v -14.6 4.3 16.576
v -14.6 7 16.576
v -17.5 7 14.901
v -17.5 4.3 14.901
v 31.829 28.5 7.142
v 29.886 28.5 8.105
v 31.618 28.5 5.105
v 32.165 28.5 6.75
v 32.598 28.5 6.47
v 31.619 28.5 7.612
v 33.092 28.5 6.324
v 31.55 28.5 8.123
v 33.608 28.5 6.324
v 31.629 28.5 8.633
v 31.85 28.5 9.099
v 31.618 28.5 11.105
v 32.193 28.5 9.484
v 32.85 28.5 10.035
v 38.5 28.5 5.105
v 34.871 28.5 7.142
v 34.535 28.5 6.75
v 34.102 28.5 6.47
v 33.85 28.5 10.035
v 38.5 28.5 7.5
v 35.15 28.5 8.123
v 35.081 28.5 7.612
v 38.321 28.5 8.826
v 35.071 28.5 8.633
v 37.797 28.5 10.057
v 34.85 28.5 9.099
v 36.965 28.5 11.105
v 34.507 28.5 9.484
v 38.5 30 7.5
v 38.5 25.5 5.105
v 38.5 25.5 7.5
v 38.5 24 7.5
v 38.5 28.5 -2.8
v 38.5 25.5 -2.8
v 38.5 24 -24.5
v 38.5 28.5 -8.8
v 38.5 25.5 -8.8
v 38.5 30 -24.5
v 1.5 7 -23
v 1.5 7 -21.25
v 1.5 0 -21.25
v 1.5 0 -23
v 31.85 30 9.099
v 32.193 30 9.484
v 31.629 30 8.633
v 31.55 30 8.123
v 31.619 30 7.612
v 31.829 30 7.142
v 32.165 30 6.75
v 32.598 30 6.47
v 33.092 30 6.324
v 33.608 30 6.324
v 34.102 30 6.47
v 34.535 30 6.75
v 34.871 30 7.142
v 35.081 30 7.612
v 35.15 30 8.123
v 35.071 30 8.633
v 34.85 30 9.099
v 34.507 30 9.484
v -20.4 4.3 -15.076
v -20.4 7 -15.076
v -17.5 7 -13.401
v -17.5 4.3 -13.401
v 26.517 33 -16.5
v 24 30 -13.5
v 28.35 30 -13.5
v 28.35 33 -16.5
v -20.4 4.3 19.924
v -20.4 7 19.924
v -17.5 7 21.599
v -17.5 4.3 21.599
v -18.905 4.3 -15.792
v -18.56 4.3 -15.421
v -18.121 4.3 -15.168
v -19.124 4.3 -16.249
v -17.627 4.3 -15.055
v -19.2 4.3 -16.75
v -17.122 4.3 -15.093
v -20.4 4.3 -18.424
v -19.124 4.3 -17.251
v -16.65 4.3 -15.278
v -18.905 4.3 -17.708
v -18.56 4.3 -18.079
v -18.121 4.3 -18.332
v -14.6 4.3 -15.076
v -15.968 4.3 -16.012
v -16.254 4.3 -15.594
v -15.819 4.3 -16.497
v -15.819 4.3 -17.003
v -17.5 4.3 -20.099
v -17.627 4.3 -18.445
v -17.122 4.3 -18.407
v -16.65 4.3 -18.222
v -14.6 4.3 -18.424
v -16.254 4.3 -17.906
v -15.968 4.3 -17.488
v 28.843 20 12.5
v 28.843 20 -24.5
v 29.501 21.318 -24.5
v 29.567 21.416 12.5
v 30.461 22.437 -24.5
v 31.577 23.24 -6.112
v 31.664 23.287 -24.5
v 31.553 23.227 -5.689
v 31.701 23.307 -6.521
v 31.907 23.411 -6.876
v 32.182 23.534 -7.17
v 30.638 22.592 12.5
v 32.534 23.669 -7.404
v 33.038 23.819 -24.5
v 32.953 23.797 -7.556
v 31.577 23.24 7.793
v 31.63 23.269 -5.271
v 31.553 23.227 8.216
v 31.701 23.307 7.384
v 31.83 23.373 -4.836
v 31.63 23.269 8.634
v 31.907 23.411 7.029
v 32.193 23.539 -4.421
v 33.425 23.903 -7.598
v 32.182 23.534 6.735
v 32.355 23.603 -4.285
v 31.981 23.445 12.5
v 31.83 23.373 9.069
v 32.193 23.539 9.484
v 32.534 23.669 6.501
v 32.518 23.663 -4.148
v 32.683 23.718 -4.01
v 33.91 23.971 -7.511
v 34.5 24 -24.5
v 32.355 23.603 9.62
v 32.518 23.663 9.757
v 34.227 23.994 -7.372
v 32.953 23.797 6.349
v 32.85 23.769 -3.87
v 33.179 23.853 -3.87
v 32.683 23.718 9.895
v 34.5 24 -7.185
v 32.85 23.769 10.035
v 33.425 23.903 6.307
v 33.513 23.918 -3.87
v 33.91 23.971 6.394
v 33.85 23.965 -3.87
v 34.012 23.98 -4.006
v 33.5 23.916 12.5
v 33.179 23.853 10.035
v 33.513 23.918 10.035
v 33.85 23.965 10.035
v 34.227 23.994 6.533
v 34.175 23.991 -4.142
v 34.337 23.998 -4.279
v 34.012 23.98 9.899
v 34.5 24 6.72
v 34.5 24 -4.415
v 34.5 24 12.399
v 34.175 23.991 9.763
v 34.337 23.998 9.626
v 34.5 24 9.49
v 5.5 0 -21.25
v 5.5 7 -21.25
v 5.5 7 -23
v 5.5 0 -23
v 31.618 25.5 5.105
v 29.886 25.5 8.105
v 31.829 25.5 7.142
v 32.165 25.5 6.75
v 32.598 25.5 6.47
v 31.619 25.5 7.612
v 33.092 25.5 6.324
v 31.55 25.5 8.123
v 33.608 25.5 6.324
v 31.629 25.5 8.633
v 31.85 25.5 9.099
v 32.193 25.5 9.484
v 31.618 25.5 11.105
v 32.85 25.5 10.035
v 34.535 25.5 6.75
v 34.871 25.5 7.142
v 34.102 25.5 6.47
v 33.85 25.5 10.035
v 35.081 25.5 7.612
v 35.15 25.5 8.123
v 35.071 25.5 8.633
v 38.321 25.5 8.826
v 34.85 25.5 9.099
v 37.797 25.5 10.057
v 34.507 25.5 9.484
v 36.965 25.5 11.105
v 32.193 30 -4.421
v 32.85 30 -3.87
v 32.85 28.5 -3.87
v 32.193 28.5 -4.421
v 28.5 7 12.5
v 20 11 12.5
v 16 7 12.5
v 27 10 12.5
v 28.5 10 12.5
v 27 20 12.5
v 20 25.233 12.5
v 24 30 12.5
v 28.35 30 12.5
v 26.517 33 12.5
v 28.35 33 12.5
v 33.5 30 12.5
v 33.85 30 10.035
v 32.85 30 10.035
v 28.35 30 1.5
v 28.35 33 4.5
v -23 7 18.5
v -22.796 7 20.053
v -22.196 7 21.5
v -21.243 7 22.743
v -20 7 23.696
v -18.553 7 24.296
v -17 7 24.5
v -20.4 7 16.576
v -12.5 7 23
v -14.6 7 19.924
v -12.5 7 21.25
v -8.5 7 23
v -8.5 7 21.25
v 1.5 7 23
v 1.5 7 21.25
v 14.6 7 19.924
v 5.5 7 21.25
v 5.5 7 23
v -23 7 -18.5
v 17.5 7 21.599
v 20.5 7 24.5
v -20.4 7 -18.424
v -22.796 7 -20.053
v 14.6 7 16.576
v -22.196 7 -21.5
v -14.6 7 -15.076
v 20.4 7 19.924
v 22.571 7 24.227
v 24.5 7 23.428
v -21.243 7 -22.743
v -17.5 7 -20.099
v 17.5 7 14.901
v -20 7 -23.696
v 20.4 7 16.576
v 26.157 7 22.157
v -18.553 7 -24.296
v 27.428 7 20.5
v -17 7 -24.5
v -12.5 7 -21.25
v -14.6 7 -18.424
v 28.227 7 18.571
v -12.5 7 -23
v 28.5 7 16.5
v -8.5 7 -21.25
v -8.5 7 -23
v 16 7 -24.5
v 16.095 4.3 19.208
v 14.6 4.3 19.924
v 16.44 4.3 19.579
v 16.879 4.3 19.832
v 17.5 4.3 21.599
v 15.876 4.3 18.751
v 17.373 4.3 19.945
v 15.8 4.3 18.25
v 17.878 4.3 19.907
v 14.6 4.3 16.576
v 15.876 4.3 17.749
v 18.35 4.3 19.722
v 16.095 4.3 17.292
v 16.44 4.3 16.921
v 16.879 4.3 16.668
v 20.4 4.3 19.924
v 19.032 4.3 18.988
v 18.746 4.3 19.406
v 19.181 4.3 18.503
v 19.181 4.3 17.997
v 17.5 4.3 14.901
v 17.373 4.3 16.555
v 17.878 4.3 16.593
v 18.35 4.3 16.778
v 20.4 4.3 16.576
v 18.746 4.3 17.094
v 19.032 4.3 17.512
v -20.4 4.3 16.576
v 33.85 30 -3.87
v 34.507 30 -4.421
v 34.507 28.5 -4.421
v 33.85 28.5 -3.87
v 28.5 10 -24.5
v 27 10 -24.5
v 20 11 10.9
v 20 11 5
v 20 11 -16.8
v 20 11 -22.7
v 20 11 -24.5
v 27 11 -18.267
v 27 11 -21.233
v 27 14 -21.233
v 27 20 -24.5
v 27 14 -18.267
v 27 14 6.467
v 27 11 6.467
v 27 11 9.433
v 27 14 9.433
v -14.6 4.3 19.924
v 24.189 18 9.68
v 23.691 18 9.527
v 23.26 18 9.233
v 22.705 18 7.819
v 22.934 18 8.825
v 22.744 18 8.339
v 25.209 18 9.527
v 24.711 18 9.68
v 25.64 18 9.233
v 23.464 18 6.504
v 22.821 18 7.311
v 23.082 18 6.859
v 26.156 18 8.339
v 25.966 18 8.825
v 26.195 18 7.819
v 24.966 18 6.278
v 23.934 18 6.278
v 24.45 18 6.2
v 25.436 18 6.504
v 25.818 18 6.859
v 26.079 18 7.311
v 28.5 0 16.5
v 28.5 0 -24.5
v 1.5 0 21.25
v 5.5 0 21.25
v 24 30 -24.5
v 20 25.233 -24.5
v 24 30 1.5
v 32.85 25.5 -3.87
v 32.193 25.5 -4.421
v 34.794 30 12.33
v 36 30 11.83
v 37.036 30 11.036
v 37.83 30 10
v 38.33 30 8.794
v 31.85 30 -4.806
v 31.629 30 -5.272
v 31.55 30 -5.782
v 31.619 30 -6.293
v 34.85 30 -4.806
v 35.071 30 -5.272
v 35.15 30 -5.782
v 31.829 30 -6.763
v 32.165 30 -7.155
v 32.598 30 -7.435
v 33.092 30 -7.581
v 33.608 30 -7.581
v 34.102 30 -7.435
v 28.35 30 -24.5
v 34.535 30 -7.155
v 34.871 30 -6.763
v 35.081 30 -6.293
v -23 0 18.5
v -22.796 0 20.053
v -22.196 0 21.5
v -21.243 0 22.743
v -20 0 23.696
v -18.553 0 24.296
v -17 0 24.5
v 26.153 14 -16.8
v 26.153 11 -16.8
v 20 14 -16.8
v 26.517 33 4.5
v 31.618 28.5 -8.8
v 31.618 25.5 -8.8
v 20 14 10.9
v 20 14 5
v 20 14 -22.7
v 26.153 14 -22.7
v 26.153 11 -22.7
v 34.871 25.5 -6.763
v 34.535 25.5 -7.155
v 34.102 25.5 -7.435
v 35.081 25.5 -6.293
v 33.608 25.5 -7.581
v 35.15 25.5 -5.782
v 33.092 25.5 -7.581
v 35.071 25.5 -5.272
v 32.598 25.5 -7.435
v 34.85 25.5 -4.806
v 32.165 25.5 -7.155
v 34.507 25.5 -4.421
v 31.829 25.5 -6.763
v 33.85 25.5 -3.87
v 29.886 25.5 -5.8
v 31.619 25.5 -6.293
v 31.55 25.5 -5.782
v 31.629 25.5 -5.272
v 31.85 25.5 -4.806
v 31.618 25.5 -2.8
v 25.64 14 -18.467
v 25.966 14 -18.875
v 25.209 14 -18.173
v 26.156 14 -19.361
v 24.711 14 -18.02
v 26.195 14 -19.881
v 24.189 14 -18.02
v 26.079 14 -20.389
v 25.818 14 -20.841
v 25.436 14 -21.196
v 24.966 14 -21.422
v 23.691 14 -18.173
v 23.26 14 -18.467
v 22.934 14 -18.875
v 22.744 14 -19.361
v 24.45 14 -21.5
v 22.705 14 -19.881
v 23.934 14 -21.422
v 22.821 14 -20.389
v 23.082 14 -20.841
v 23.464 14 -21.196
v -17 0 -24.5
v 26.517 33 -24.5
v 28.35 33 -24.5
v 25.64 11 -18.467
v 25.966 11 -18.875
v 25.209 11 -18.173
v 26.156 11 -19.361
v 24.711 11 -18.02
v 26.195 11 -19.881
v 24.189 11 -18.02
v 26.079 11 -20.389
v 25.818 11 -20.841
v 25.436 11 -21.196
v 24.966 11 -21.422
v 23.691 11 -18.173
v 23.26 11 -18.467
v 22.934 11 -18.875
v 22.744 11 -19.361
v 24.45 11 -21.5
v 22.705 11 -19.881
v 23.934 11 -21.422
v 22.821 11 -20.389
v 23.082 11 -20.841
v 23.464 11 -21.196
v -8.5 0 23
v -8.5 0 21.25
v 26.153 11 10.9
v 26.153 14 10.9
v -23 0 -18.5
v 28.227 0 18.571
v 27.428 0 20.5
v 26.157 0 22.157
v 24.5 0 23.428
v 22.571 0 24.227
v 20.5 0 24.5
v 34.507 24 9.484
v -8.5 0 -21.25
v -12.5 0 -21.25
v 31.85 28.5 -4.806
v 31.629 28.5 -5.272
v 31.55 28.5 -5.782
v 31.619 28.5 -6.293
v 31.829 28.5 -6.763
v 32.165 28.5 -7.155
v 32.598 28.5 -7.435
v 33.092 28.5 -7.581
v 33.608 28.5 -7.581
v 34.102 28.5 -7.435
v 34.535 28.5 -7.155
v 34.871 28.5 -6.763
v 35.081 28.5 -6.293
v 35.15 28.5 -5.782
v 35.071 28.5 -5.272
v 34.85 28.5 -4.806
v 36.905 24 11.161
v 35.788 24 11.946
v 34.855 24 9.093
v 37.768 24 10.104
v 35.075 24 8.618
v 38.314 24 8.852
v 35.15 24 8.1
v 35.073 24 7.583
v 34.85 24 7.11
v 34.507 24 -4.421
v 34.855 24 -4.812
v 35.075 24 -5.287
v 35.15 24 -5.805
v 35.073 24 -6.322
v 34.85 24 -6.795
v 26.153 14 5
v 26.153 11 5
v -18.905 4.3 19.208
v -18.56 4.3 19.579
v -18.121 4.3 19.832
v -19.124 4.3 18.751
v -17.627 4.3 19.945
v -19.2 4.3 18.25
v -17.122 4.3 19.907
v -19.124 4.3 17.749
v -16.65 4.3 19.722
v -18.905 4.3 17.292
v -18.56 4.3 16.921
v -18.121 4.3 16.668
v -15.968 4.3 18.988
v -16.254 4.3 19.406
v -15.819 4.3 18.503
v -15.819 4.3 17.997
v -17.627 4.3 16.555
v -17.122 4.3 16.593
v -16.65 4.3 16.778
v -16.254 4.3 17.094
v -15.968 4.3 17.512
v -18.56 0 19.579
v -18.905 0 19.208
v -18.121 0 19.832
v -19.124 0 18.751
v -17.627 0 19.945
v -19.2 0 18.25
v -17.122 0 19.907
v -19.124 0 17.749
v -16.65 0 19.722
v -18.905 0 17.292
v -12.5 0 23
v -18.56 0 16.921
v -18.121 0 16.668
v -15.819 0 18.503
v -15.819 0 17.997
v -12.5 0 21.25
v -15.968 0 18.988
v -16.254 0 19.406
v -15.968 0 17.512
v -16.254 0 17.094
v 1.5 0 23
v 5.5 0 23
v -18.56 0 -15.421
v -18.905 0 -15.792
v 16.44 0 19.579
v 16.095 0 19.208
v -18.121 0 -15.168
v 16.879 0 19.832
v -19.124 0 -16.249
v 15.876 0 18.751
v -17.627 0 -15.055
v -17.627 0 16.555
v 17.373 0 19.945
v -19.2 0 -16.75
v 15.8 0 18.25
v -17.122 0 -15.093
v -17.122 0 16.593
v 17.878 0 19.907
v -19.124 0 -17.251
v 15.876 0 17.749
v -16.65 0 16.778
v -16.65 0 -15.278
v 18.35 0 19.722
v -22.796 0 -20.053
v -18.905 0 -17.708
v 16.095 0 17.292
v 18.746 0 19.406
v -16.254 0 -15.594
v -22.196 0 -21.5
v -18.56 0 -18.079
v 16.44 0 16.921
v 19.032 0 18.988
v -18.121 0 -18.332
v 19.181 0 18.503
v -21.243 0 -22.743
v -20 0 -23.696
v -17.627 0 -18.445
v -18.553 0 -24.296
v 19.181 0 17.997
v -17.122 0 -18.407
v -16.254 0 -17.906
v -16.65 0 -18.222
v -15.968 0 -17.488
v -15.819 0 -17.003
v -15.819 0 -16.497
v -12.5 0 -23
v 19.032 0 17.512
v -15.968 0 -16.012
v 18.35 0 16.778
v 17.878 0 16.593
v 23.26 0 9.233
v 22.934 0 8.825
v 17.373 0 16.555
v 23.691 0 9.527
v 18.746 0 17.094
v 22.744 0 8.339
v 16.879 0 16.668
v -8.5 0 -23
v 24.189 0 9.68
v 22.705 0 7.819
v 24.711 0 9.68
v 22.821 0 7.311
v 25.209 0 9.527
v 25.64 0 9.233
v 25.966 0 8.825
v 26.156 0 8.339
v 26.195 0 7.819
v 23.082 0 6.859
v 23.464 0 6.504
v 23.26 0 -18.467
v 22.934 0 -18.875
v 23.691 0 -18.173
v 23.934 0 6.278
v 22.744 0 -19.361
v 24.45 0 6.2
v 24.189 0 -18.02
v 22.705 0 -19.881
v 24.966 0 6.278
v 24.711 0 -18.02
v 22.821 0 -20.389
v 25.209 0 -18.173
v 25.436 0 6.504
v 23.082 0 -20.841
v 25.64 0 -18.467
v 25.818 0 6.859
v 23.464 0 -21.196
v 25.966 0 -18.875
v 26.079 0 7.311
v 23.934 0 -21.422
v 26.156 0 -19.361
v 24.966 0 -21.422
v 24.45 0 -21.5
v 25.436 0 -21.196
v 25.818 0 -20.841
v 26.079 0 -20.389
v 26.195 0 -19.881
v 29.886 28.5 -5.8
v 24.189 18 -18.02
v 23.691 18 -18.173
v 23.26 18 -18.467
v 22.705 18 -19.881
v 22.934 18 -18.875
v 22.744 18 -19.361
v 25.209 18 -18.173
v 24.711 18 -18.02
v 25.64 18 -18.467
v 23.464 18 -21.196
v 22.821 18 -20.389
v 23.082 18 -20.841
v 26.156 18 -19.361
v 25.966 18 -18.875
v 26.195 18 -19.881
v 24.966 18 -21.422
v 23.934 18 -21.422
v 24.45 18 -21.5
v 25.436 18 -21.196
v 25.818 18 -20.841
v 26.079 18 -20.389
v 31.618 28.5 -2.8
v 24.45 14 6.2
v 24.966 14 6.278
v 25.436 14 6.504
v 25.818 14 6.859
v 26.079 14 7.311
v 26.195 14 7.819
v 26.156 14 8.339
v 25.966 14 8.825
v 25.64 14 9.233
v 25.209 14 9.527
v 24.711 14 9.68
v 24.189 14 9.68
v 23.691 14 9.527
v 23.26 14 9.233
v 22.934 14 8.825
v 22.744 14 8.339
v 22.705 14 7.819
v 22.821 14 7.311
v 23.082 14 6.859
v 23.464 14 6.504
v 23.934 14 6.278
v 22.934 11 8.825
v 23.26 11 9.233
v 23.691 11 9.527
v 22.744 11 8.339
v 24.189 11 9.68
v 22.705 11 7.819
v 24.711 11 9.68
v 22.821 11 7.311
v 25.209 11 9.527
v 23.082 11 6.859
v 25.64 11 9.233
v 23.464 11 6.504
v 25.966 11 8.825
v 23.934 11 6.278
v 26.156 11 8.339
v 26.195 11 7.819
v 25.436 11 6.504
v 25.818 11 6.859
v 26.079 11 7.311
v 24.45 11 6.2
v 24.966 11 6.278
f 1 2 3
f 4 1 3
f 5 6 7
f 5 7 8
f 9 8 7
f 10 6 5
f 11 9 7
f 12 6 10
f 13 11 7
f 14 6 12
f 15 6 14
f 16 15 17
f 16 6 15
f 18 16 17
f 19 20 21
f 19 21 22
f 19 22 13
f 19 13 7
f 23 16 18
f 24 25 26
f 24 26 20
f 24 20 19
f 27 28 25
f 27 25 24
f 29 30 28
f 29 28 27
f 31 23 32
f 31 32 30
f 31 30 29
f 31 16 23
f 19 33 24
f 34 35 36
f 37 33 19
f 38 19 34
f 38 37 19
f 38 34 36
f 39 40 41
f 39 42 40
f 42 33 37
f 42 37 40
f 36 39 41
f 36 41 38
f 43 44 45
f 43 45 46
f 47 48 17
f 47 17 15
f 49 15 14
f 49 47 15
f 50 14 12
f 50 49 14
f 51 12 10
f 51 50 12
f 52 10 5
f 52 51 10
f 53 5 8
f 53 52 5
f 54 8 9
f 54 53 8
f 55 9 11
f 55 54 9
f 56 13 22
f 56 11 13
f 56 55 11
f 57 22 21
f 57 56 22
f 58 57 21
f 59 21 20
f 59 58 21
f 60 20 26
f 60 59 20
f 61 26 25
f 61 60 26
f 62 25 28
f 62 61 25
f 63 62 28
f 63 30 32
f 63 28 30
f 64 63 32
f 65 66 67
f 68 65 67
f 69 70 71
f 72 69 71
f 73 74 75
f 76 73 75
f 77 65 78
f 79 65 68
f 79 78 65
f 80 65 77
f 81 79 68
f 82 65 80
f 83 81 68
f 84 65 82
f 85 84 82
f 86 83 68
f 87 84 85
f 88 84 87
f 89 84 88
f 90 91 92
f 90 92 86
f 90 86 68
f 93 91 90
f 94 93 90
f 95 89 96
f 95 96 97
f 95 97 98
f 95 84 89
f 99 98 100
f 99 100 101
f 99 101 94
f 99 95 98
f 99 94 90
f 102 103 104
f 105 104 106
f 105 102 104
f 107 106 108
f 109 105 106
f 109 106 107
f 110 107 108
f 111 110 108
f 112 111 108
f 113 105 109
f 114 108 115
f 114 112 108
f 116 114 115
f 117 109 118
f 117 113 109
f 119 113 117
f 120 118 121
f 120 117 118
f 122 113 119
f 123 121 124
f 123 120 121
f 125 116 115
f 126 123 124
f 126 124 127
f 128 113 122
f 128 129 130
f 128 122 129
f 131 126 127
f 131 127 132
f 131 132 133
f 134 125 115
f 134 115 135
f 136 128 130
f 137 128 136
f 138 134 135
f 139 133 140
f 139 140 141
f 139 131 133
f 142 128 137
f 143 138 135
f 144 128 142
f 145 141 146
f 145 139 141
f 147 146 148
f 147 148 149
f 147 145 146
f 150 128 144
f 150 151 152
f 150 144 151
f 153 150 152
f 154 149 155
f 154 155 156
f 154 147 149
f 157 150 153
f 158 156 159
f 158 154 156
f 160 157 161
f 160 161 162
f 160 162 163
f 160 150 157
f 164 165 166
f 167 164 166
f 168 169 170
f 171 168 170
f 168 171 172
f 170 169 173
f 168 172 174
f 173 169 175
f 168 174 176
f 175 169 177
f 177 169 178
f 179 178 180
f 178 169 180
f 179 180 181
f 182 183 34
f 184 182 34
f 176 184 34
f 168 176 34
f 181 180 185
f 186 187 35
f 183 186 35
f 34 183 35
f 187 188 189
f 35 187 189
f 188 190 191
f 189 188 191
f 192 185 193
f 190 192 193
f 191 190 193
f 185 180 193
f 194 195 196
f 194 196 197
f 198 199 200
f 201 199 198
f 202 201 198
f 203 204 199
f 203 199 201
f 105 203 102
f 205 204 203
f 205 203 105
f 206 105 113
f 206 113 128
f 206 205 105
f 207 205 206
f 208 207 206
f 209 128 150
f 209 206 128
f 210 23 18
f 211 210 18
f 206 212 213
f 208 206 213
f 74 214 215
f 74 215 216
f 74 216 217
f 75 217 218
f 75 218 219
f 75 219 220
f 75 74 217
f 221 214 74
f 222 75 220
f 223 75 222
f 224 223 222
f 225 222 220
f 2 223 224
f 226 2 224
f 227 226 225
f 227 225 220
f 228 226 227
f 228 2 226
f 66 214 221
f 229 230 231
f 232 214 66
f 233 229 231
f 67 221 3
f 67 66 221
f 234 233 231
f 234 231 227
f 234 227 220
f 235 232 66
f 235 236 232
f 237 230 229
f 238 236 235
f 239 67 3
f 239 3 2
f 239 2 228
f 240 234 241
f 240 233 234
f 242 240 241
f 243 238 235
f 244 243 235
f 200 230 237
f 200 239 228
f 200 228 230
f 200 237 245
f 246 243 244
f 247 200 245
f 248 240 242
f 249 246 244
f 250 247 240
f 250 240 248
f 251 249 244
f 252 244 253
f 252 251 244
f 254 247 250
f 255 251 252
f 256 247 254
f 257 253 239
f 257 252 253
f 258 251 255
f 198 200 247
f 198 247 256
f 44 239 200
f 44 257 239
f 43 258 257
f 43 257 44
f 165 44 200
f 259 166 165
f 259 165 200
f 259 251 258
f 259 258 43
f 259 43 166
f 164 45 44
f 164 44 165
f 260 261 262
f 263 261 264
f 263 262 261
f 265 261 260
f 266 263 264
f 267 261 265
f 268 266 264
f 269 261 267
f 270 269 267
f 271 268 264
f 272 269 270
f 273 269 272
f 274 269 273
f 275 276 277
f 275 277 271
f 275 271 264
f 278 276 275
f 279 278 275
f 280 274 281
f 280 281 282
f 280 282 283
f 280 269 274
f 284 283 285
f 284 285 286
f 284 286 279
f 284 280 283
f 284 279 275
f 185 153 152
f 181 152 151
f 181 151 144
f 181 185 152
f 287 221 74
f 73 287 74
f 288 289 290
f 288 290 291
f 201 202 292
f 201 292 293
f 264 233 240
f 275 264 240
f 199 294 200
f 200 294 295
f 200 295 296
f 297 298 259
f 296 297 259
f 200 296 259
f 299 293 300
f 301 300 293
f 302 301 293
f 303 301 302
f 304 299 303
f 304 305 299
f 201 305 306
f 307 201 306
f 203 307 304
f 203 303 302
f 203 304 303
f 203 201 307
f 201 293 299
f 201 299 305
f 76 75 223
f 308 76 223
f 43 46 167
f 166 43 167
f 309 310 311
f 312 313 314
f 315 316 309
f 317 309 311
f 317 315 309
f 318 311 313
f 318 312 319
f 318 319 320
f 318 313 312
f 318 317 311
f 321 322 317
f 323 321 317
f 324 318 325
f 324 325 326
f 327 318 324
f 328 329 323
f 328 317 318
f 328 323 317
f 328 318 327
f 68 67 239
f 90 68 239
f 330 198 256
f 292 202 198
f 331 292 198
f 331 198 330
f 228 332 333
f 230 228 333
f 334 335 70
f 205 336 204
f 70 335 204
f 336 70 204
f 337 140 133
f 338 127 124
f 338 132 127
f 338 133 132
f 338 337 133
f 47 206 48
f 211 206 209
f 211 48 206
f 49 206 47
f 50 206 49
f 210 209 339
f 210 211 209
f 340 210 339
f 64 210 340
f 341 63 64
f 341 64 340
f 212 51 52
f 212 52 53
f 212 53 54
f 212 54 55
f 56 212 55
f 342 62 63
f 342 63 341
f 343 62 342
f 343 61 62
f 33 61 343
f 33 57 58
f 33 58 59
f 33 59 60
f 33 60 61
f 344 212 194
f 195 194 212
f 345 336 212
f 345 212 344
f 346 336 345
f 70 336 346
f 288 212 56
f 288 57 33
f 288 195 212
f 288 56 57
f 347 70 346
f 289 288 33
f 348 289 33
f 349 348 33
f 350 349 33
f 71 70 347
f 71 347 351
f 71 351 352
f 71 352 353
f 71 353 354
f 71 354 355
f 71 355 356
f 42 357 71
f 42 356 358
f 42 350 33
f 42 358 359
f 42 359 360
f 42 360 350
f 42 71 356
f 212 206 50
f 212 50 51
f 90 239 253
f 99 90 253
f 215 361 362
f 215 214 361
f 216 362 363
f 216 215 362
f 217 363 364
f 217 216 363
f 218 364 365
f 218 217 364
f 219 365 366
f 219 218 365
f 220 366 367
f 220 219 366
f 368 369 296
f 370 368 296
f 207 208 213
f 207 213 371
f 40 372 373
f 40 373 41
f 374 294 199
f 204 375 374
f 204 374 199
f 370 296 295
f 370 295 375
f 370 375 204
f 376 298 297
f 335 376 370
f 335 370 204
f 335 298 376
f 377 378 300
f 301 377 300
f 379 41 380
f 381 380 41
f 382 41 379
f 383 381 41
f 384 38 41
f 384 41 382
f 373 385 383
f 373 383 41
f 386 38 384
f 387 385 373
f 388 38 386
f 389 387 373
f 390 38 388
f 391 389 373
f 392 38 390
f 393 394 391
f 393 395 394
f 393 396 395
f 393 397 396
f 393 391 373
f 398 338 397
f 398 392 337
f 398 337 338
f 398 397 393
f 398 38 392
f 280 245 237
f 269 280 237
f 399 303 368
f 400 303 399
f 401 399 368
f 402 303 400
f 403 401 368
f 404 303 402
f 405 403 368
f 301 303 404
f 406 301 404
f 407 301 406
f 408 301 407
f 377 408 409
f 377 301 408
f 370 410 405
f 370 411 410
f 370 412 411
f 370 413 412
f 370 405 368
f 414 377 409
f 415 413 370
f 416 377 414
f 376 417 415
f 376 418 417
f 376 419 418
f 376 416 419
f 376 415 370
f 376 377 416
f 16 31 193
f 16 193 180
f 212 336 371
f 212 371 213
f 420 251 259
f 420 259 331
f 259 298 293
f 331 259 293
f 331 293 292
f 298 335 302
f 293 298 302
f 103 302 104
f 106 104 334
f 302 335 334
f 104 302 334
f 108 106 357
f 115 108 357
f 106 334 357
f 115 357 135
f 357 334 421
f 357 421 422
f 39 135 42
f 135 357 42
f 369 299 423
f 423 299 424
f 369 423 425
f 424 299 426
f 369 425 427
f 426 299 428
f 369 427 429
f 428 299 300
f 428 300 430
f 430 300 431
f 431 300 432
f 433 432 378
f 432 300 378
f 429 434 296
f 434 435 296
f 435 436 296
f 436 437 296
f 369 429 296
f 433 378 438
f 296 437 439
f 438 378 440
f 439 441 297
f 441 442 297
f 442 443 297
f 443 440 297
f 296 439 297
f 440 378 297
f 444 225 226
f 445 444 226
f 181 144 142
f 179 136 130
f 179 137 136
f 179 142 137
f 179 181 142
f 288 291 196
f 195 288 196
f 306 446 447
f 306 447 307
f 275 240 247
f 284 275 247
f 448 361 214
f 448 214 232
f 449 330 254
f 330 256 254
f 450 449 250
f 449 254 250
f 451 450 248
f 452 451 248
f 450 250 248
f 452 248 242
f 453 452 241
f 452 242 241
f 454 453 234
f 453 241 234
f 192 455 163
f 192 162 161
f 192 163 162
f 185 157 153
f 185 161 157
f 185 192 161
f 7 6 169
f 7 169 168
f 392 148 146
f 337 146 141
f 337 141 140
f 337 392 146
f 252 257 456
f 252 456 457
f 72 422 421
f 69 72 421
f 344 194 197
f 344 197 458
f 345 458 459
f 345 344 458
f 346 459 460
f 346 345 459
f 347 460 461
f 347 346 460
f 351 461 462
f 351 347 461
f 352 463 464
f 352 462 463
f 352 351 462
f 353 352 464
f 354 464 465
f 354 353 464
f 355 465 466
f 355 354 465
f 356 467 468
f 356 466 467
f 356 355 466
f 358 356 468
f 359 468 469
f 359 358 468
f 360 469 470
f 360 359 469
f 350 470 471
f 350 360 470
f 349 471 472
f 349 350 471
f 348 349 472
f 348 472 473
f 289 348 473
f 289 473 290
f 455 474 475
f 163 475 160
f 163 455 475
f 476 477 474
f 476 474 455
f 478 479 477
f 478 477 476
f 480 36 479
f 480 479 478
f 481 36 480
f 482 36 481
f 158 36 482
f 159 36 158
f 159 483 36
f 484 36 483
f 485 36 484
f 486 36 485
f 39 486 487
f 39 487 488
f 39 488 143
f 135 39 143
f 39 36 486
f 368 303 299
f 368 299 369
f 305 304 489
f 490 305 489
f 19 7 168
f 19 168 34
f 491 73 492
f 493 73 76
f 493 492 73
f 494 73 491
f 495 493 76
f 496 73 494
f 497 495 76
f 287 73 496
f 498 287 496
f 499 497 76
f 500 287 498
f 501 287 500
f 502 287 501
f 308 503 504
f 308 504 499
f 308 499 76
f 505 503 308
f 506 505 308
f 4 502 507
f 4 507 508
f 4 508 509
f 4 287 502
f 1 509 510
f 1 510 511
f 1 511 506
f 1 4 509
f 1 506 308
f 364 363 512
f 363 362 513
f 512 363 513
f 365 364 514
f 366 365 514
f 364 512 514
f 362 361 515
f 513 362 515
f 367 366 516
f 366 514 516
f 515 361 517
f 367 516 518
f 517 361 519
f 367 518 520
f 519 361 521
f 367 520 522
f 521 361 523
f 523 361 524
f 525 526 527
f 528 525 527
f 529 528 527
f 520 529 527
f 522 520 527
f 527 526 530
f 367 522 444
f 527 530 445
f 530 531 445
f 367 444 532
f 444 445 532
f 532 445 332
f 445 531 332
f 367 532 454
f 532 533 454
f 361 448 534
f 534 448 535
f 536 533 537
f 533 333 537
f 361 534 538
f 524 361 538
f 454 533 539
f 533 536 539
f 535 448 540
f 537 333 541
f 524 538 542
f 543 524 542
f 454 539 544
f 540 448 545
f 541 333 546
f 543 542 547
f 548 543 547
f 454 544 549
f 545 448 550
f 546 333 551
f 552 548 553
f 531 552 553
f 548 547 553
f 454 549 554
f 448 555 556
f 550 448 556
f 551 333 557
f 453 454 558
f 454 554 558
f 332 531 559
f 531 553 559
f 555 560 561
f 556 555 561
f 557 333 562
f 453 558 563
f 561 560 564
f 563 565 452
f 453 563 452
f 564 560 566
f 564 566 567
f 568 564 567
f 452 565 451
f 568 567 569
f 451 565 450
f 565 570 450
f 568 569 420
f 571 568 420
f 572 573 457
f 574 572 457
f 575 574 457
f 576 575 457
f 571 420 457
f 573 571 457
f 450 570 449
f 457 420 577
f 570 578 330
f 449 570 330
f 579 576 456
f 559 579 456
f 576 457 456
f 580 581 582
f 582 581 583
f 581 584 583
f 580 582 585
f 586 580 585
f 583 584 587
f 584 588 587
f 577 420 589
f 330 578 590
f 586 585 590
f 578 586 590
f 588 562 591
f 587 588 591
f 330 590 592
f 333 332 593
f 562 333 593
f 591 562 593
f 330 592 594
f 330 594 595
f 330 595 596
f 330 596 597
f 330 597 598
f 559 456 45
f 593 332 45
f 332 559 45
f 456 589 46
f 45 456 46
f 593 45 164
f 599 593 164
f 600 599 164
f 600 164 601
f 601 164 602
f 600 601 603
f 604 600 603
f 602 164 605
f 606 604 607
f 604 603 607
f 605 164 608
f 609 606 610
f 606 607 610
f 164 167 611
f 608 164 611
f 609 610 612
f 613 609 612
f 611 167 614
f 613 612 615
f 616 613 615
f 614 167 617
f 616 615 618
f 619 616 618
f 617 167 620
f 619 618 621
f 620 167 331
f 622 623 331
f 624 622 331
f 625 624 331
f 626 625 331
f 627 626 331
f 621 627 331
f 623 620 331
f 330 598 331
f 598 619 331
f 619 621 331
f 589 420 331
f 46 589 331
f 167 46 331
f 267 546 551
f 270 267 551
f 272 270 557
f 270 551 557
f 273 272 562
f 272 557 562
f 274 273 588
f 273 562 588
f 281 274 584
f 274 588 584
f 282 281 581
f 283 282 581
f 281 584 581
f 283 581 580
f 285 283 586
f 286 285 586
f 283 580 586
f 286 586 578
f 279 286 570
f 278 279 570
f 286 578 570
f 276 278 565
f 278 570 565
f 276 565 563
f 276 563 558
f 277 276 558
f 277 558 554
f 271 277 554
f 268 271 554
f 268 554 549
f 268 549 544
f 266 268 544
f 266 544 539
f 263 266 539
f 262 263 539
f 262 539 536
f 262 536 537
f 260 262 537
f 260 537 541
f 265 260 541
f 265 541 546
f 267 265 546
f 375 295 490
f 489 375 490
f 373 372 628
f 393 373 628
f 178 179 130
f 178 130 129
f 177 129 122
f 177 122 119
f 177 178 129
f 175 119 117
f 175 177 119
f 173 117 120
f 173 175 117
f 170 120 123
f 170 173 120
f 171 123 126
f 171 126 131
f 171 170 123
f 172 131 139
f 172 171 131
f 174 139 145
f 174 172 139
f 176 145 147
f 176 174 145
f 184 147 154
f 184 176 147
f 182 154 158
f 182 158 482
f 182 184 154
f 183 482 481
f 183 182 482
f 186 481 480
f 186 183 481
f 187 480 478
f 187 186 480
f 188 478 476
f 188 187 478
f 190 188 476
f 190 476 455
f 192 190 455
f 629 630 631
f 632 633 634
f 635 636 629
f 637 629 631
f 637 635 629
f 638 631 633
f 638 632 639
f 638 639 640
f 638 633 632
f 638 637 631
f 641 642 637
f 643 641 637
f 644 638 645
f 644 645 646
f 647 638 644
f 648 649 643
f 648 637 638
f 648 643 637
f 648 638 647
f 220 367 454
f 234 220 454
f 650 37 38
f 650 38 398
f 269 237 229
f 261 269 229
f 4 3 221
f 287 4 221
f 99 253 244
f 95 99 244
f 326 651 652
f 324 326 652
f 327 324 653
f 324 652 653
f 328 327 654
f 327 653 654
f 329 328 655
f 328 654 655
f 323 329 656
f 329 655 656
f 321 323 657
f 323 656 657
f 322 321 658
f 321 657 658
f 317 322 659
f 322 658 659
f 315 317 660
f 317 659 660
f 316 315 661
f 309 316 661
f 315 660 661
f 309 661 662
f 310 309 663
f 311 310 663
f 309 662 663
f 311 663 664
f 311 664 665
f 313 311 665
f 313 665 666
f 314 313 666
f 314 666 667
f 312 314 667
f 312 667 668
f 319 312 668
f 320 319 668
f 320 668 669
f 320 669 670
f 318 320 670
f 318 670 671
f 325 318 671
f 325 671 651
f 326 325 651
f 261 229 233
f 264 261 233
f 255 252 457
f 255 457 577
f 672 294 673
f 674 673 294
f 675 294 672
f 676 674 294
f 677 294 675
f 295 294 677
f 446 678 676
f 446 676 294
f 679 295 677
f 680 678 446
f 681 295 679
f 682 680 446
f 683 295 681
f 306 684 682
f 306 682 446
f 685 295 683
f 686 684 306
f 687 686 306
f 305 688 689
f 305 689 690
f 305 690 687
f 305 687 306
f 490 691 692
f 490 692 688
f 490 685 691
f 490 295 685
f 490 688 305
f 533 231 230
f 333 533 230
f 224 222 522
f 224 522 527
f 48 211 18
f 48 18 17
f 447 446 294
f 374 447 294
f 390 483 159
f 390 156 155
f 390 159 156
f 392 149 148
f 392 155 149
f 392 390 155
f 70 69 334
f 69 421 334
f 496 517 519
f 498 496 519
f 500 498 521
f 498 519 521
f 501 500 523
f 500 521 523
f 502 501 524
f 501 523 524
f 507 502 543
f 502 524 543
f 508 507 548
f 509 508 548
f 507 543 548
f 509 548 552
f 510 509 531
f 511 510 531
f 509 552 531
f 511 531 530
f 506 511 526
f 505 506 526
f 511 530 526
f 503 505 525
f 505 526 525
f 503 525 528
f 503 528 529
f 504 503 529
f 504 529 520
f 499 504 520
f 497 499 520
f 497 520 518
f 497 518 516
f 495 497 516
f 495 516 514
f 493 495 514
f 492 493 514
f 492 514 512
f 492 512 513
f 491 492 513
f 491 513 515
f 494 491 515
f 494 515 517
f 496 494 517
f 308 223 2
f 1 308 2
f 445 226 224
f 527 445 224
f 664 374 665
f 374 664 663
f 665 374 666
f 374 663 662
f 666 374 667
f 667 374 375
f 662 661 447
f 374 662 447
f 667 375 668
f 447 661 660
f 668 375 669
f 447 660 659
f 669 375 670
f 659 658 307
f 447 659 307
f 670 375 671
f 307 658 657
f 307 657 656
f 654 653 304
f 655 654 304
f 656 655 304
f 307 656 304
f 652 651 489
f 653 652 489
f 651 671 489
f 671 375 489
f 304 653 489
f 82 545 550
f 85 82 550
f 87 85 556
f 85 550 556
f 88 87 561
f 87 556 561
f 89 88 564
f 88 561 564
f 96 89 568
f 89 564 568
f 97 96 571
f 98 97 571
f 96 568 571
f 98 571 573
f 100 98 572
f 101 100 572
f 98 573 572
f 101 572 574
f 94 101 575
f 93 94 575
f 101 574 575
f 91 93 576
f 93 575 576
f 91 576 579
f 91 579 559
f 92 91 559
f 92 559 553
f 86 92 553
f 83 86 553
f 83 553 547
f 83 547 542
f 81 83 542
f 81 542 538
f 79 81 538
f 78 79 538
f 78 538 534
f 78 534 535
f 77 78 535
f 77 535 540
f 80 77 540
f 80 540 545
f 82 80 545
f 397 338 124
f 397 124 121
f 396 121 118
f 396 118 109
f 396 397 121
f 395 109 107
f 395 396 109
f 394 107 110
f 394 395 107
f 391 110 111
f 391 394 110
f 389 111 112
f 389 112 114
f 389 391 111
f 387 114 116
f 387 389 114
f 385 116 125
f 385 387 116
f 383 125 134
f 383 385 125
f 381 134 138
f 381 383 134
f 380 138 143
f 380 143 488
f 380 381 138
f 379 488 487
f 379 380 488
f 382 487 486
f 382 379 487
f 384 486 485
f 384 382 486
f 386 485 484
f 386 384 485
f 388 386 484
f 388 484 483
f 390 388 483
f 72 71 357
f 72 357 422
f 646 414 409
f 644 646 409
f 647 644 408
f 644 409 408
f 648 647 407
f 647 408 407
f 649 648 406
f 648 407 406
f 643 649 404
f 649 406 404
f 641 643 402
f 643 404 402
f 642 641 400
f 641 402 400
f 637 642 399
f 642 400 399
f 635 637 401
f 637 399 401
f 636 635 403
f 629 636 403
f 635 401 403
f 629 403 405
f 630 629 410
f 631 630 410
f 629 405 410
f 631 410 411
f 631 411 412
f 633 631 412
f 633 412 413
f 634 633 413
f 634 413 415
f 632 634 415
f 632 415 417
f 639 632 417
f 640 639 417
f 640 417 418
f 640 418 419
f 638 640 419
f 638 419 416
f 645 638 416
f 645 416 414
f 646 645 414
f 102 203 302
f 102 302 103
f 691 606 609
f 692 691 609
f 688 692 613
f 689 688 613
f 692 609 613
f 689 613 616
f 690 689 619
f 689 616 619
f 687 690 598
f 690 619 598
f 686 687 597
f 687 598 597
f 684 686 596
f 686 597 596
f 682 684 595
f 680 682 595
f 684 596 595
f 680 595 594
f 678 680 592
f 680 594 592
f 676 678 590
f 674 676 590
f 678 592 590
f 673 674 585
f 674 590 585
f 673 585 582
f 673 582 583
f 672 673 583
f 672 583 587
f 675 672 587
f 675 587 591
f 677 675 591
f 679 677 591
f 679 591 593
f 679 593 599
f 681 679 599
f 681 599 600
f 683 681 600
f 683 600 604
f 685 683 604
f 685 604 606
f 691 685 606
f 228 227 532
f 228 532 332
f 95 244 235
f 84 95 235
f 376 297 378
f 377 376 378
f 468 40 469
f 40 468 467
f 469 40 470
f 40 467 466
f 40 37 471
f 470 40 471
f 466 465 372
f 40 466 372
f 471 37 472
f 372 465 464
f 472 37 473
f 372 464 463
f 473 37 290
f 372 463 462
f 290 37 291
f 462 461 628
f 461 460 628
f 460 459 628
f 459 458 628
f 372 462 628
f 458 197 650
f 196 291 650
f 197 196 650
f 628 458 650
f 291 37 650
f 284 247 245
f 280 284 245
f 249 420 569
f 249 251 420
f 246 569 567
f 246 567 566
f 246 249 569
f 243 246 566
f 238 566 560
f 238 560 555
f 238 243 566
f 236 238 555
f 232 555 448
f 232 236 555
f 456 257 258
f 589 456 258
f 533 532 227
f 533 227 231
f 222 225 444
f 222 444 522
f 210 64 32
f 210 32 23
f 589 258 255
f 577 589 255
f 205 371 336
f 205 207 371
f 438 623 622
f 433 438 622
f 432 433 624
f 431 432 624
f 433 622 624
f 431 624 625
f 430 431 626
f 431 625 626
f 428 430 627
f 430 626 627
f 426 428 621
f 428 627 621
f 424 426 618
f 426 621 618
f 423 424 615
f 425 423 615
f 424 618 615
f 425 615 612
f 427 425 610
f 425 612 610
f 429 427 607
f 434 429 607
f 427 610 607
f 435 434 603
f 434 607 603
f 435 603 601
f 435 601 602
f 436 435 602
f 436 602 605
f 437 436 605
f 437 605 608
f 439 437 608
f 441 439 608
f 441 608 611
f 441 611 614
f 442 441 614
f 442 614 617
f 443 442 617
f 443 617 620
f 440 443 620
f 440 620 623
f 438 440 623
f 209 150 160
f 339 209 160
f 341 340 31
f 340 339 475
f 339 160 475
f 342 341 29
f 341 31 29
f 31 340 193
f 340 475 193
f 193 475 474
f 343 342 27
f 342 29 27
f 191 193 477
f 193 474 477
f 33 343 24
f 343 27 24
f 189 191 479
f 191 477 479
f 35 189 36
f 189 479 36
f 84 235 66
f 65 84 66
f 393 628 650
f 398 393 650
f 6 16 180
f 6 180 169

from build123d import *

# Parameters (mm, degrees)
CROQUIS16_W                  = 51.5
CROQUIS16_H                  = 49
SALIENTE_EXTRUIR3_DEPTH      = 7
SALIENTE_EXTRUIR4_DEPTH      = 37
TALADRO_DE_MARGEN_PARA_M31_D = 3.4
REDONDEO1_R                  = 6
REDONDEO2_R                  = 8
CORTAR_EXTRUIR14_DEPTH       = 2.7
REDONDEO3_R                  = 6
CORTAR_EXTRUIR12_DEPTH       = 55.612269684
REDONDEO11_R                 = 5
SALIENTE_EXTRUIR5_DEPTH      = 37
CHAFL_N3_SIZE                = 4
CHAFL_N3_SIZE2               = 4.76701437
CROQUIS29_R                  = 1.75
CORTAR_EXTRUIR17_DEPTH       = 18
CORTAR_EXTRUIR18_DEPTH       = 3
CORTAR_EXTRUIR20_DEPTH       = 3
CORTAR_EXTRUIR21_REACH       = 53.103
CROQUIS31_W                  = 4
CROQUIS31_H                  = 1.75
SALIENTE_EXTRUIR10_DEPTH     = 8
CHAFL_N7_SIZE                = 3
CORTAR_EXTRUIR22_START       = -40
CORTAR_EXTRUIR22_DEPTH       = 40


with BuildPart() as part:
    # Croquis16 → Saliente-Extruir3 (new body)
    with BuildSketch(Plane(origin=(0, 0, 0), x_dir=(1, 0, 0), z_dir=(0, 1, 0))):
        with Locations((2.75, 0)):
            Rectangle(CROQUIS16_W, CROQUIS16_H)
    extrude(amount=SALIENTE_EXTRUIR3_DEPTH)

    # Croquis17 → Saliente-Extruir4 (add)
    with BuildSketch(Plane.XY.offset(-24.5)):
        Polygon((38.5, 30), (38.5, 24), (28.5, 24), (28.5, 7), (20, 7), (20, 30), align=None)
    extrude(amount=SALIENTE_EXTRUIR4_DEPTH)

    # Taladro de margen para M31 (through all)
    with Locations(Plane(origin=(0, 7, 0), x_dir=(1, 0, 0), z_dir=(0, 1, 0))):
        with Locations((-17.5, 16.75), (17.5, -18.25), (-17.5, -18.25)):
            Hole(TALADRO_DE_MARGEN_PARA_M31_D / 2)

    # Redondeo1
    redondeo1_edges = [part.edges().sort_by_distance(p)[0] for p in [
        (-23, 3.5, -24.5),
        (-23, 3.5, 24.5),
    ]]
    fillet(redondeo1_edges, radius=REDONDEO1_R)

    # Redondeo2
    redondeo2_edges = [part.edges().sort_by_distance(p)[0] for p in [
        (28.5, 3.5, 24.5),
    ]]
    fillet(redondeo2_edges, radius=REDONDEO2_R)

    # Croquis24 → Cortar-Extruir14 (cut)
    with BuildSketch(Plane(origin=(0, 7, 0), x_dir=(1, 0, 0), z_dir=(0, 1, 0))):
        Polygon((-17.5, -21.598631561), (-14.6, -19.924315781), (-14.6, -16.575684219), (-17.5, -14.901368439), (-20.4, -16.575684219), (-20.4, -19.924315781), align=None)
        Polygon((17.5, -21.598631561), (20.4, -19.924315781), (20.4, -16.575684219), (17.5, -14.901368439), (14.6, -16.575684219), (14.6, -19.924315781), align=None)
        Polygon((-17.5, 20.098631561), (-20.4, 18.424315781), (-20.4, 15.075684219), (-17.5, 13.401368439), (-14.6, 15.075684219), (-14.6, 18.424315781), align=None)
    extrude(amount=-CORTAR_EXTRUIR14_DEPTH, mode=Mode.SUBTRACT)

    # Redondeo3
    redondeo3_edges = [part.edges().sort_by_distance(p)[0] for p in [
        (28.5, 24, -6),
    ]]
    fillet(redondeo3_edges, radius=REDONDEO3_R)

    # Croquis21 → Cortar-Extruir12 (cut, through all)
    with BuildSketch(Plane(origin=(0, 30, 0), x_dir=(1, 0, 0), z_dir=(0, 1, 0))):
        with BuildLine():
            Line((34.507017697, 4.421120002), (33.85, 3.869816695))
            Line((33.85, 3.869816695), (32.85, 3.869816695))
            Line((32.85, 3.869816695), (32.192982303, 4.421120002))
            ThreePointArc((32.192982303, 4.421120002), (33.35, 7.6), (34.507017697, 4.421120002))
        make_face()
        with BuildLine():
            Line((33.85, -10.035183305), (32.85, -10.035183305))
            Line((32.85, -10.035183305), (32.192982303, -9.483879998))
            ThreePointArc((32.192982303, -9.483879998), (33.35, -6.305), (34.507017697, -9.483879998))
            Line((34.507017697, -9.483879998), (33.85, -10.035183305))
        make_face()
    extrude(amount=-CORTAR_EXTRUIR12_DEPTH, mode=Mode.SUBTRACT)

    # Redondeo11
    redondeo11_edges = [part.edges().sort_by_distance(p)[0] for p in [
        (38.5, 27, 12.5),
    ]]
    fillet(redondeo11_edges, radius=REDONDEO11_R)

    # Croquis26 → Saliente-Extruir5 (add)
    with BuildSketch(Plane(origin=(0, 0, -24.5), x_dir=(-1, 0, 0), z_dir=(0, 0, -1))):
        Polygon((-20, 11), (-16, 7), (-20, 7), align=None)
    extrude(amount=-SALIENTE_EXTRUIR5_DEPTH)

    # Chaflán3
    chafl_n3_edges = [part.edges().sort_by_distance(p)[0] for p in [
        (20, 30, -6),
    ]]
    chafl_n3_side = [part.faces().sort_by_distance(p)[0] for p in [
        (29.053844861, 30, -6.369586264),
    ]]
    chamfer(chafl_n3_edges, length=CHAFL_N3_SIZE, length2=CHAFL_N3_SIZE2, reference=chafl_n3_side[0])

    # Croquis29 → Cortar-Extruir17 (cut)
    with BuildSketch(Plane.XZ):
        with Locations(Location((24.45, -19.75, 0), (0, 0, 270))):
            Circle(CROQUIS29_R)
        with Locations(Location((24.45, 7.95, 0), (0, 0, 270))):
            Circle(CROQUIS29_R)
    extrude(amount=-CORTAR_EXTRUIR17_DEPTH, mode=Mode.SUBTRACT)

    # Croquis30 → Cortar-Extruir18 (cut)
    with BuildSketch(Plane(origin=(0, 11, 0), x_dir=(-1, 0, 0), z_dir=(0, -1, 0))):
        Polygon((-22.746816706, 16.8), (-20, 16.8), (-20, 22.7), (-22.746816706, 22.7), (-26.153183294, 22.7), (-27.856366588, 19.75), (-26.153183294, 16.8), align=None)
        Polygon((-20, -10.9), (-22.746816706, -10.9), (-26.153183294, -10.9), (-27.856366588, -7.95), (-26.153183294, -5), (-22.746816706, -5), (-20, -5), align=None)
    extrude(amount=-CORTAR_EXTRUIR18_DEPTH, mode=Mode.SUBTRACT)

    # Croquis25 → Cortar-Extruir20 (cut)
    with BuildSketch(Plane.XZ.offset(-28.5)):
        Polygon((35.082050808, -2.8), (38.5, -2.8), (38.5, -8.8), (35.082050808, -8.8), (31.617949192, -8.8), (29.885898385, -5.8), (31.617949192, -2.8), align=None)
        Polygon((31.617949192, 11.105), (29.885898385, 8.105), (31.617949192, 5.105), (35.082050808, 5.105), (40.5, 5.105), (40.5, 11.105), (35.082050808, 11.105), align=None)
    extrude(amount=CORTAR_EXTRUIR20_DEPTH, mode=Mode.SUBTRACT)

    # Croquis31 → Cortar-Extruir21 (cut, up to next)
    with BuildSketch(Plane(origin=(0, 7, 0), x_dir=(1, 0, 0), z_dir=(0, 1, 0)), mode=Mode.PRIVATE) as cortar_extruir21_sk1:
        with Locations((3.5, 22.125)):
            Rectangle(CROQUIS31_W, CROQUIS31_H)
    cortar_extruir21_tool1 = extrude(cortar_extruir21_sk1.sketch, amount=-CORTAR_EXTRUIR21_REACH, mode=Mode.PRIVATE) & part.part
    # Croquis31 → Cortar-Extruir21 (cut, up to next)
    with BuildSketch(Plane(origin=(0, 7, 0), x_dir=(1, 0, 0), z_dir=(0, 1, 0)), mode=Mode.PRIVATE) as cortar_extruir21_sk2:
        with Locations((3.5, -22.125)):
            Rectangle(CROQUIS31_W, CROQUIS31_H)
    cortar_extruir21_tool2 = extrude(cortar_extruir21_sk2.sketch, amount=-CORTAR_EXTRUIR21_REACH, mode=Mode.PRIVATE) & part.part
    cortar_extruir21_1 = cortar_extruir21_tool1.solids().sort_by_distance((3.5, 7, -22.125))[0]
    add(cortar_extruir21_1, mode=Mode.SUBTRACT)
    cortar_extruir21_2 = cortar_extruir21_tool2.solids().sort_by_distance((3.5, 7, 22.125))[0]
    add(cortar_extruir21_2, mode=Mode.SUBTRACT)
    cortar_extruir21 = cortar_extruir21_1 + cortar_extruir21_2  # Cortar-Extruir21 as one shape, for the pattern or mirror that repeats it

    # Croquis38 → Saliente-Extruir10 (add)
    with BuildSketch(Plane(origin=(0, 0, -24.5), x_dir=(-1, 0, 0), z_dir=(0, 0, -1))):
        Polygon((-24, 30), (-28.35, 30), (-28.35, 33), (-26.517298894, 33), align=None)
    saliente_extruir10 = extrude(amount=-SALIENTE_EXTRUIR10_DEPTH)

    # Simetría3: Saliente-Extruir10 across plane
    add(saliente_extruir10.mirror(Plane(origin=(0, 0, -6), x_dir=(1, 0, 0), z_dir=(0, 0, -1))))

    # Chaflán7
    chafl_n7_edges = [part.edges().sort_by_distance(p)[0] for p in [
        (26.175, 30, 4.5),
        (26.175, 30, -16.5),
    ]]
    chamfer(chafl_n7_edges, length=CHAFL_N7_SIZE - 0.0001)  # a hair under: the kernel refuses the full size

    # Simetría4: Cortar-Extruir21 across plane
    add(cortar_extruir21.mirror(Plane(origin=(-3.5, 0, 0), x_dir=(0, 0, 1), z_dir=(1, 0, 0))), mode=Mode.SUBTRACT)

    # Croquis39 → Cortar-Extruir22 (cut)
    with BuildSketch(Plane(origin=(0, 0, -24.5), x_dir=(-1, 0, 0), z_dir=(0, 0, -1)).offset(CORTAR_EXTRUIR22_START)):
        with BuildLine():
            Line((-28.5, 10), (-28.5, 18))
            ThreePointArc((-28.5, 18), (-28.586408642, 19.014611872), (-28.843145751, 20))
            Line((-28.843145751, 20), (-30, 20))
            Line((-30, 20), (-30, 10))
            Line((-30, 10), (-28.5, 10))
        make_face()
        Polygon((-27, 20), (-28.5, 20), (-28.5, 18), (-28.5, 10), (-27, 10), align=None)
        with BuildLine():
            Line((-28.5, 18), (-28.5, 20))
            Line((-28.5, 20), (-28.843145751, 20))
            ThreePointArc((-28.843145751, 20), (-28.586408642, 19.014611872), (-28.5, 18))
        make_face()
    extrude(amount=CORTAR_EXTRUIR22_DEPTH, mode=Mode.SUBTRACT)


solid = part.part
